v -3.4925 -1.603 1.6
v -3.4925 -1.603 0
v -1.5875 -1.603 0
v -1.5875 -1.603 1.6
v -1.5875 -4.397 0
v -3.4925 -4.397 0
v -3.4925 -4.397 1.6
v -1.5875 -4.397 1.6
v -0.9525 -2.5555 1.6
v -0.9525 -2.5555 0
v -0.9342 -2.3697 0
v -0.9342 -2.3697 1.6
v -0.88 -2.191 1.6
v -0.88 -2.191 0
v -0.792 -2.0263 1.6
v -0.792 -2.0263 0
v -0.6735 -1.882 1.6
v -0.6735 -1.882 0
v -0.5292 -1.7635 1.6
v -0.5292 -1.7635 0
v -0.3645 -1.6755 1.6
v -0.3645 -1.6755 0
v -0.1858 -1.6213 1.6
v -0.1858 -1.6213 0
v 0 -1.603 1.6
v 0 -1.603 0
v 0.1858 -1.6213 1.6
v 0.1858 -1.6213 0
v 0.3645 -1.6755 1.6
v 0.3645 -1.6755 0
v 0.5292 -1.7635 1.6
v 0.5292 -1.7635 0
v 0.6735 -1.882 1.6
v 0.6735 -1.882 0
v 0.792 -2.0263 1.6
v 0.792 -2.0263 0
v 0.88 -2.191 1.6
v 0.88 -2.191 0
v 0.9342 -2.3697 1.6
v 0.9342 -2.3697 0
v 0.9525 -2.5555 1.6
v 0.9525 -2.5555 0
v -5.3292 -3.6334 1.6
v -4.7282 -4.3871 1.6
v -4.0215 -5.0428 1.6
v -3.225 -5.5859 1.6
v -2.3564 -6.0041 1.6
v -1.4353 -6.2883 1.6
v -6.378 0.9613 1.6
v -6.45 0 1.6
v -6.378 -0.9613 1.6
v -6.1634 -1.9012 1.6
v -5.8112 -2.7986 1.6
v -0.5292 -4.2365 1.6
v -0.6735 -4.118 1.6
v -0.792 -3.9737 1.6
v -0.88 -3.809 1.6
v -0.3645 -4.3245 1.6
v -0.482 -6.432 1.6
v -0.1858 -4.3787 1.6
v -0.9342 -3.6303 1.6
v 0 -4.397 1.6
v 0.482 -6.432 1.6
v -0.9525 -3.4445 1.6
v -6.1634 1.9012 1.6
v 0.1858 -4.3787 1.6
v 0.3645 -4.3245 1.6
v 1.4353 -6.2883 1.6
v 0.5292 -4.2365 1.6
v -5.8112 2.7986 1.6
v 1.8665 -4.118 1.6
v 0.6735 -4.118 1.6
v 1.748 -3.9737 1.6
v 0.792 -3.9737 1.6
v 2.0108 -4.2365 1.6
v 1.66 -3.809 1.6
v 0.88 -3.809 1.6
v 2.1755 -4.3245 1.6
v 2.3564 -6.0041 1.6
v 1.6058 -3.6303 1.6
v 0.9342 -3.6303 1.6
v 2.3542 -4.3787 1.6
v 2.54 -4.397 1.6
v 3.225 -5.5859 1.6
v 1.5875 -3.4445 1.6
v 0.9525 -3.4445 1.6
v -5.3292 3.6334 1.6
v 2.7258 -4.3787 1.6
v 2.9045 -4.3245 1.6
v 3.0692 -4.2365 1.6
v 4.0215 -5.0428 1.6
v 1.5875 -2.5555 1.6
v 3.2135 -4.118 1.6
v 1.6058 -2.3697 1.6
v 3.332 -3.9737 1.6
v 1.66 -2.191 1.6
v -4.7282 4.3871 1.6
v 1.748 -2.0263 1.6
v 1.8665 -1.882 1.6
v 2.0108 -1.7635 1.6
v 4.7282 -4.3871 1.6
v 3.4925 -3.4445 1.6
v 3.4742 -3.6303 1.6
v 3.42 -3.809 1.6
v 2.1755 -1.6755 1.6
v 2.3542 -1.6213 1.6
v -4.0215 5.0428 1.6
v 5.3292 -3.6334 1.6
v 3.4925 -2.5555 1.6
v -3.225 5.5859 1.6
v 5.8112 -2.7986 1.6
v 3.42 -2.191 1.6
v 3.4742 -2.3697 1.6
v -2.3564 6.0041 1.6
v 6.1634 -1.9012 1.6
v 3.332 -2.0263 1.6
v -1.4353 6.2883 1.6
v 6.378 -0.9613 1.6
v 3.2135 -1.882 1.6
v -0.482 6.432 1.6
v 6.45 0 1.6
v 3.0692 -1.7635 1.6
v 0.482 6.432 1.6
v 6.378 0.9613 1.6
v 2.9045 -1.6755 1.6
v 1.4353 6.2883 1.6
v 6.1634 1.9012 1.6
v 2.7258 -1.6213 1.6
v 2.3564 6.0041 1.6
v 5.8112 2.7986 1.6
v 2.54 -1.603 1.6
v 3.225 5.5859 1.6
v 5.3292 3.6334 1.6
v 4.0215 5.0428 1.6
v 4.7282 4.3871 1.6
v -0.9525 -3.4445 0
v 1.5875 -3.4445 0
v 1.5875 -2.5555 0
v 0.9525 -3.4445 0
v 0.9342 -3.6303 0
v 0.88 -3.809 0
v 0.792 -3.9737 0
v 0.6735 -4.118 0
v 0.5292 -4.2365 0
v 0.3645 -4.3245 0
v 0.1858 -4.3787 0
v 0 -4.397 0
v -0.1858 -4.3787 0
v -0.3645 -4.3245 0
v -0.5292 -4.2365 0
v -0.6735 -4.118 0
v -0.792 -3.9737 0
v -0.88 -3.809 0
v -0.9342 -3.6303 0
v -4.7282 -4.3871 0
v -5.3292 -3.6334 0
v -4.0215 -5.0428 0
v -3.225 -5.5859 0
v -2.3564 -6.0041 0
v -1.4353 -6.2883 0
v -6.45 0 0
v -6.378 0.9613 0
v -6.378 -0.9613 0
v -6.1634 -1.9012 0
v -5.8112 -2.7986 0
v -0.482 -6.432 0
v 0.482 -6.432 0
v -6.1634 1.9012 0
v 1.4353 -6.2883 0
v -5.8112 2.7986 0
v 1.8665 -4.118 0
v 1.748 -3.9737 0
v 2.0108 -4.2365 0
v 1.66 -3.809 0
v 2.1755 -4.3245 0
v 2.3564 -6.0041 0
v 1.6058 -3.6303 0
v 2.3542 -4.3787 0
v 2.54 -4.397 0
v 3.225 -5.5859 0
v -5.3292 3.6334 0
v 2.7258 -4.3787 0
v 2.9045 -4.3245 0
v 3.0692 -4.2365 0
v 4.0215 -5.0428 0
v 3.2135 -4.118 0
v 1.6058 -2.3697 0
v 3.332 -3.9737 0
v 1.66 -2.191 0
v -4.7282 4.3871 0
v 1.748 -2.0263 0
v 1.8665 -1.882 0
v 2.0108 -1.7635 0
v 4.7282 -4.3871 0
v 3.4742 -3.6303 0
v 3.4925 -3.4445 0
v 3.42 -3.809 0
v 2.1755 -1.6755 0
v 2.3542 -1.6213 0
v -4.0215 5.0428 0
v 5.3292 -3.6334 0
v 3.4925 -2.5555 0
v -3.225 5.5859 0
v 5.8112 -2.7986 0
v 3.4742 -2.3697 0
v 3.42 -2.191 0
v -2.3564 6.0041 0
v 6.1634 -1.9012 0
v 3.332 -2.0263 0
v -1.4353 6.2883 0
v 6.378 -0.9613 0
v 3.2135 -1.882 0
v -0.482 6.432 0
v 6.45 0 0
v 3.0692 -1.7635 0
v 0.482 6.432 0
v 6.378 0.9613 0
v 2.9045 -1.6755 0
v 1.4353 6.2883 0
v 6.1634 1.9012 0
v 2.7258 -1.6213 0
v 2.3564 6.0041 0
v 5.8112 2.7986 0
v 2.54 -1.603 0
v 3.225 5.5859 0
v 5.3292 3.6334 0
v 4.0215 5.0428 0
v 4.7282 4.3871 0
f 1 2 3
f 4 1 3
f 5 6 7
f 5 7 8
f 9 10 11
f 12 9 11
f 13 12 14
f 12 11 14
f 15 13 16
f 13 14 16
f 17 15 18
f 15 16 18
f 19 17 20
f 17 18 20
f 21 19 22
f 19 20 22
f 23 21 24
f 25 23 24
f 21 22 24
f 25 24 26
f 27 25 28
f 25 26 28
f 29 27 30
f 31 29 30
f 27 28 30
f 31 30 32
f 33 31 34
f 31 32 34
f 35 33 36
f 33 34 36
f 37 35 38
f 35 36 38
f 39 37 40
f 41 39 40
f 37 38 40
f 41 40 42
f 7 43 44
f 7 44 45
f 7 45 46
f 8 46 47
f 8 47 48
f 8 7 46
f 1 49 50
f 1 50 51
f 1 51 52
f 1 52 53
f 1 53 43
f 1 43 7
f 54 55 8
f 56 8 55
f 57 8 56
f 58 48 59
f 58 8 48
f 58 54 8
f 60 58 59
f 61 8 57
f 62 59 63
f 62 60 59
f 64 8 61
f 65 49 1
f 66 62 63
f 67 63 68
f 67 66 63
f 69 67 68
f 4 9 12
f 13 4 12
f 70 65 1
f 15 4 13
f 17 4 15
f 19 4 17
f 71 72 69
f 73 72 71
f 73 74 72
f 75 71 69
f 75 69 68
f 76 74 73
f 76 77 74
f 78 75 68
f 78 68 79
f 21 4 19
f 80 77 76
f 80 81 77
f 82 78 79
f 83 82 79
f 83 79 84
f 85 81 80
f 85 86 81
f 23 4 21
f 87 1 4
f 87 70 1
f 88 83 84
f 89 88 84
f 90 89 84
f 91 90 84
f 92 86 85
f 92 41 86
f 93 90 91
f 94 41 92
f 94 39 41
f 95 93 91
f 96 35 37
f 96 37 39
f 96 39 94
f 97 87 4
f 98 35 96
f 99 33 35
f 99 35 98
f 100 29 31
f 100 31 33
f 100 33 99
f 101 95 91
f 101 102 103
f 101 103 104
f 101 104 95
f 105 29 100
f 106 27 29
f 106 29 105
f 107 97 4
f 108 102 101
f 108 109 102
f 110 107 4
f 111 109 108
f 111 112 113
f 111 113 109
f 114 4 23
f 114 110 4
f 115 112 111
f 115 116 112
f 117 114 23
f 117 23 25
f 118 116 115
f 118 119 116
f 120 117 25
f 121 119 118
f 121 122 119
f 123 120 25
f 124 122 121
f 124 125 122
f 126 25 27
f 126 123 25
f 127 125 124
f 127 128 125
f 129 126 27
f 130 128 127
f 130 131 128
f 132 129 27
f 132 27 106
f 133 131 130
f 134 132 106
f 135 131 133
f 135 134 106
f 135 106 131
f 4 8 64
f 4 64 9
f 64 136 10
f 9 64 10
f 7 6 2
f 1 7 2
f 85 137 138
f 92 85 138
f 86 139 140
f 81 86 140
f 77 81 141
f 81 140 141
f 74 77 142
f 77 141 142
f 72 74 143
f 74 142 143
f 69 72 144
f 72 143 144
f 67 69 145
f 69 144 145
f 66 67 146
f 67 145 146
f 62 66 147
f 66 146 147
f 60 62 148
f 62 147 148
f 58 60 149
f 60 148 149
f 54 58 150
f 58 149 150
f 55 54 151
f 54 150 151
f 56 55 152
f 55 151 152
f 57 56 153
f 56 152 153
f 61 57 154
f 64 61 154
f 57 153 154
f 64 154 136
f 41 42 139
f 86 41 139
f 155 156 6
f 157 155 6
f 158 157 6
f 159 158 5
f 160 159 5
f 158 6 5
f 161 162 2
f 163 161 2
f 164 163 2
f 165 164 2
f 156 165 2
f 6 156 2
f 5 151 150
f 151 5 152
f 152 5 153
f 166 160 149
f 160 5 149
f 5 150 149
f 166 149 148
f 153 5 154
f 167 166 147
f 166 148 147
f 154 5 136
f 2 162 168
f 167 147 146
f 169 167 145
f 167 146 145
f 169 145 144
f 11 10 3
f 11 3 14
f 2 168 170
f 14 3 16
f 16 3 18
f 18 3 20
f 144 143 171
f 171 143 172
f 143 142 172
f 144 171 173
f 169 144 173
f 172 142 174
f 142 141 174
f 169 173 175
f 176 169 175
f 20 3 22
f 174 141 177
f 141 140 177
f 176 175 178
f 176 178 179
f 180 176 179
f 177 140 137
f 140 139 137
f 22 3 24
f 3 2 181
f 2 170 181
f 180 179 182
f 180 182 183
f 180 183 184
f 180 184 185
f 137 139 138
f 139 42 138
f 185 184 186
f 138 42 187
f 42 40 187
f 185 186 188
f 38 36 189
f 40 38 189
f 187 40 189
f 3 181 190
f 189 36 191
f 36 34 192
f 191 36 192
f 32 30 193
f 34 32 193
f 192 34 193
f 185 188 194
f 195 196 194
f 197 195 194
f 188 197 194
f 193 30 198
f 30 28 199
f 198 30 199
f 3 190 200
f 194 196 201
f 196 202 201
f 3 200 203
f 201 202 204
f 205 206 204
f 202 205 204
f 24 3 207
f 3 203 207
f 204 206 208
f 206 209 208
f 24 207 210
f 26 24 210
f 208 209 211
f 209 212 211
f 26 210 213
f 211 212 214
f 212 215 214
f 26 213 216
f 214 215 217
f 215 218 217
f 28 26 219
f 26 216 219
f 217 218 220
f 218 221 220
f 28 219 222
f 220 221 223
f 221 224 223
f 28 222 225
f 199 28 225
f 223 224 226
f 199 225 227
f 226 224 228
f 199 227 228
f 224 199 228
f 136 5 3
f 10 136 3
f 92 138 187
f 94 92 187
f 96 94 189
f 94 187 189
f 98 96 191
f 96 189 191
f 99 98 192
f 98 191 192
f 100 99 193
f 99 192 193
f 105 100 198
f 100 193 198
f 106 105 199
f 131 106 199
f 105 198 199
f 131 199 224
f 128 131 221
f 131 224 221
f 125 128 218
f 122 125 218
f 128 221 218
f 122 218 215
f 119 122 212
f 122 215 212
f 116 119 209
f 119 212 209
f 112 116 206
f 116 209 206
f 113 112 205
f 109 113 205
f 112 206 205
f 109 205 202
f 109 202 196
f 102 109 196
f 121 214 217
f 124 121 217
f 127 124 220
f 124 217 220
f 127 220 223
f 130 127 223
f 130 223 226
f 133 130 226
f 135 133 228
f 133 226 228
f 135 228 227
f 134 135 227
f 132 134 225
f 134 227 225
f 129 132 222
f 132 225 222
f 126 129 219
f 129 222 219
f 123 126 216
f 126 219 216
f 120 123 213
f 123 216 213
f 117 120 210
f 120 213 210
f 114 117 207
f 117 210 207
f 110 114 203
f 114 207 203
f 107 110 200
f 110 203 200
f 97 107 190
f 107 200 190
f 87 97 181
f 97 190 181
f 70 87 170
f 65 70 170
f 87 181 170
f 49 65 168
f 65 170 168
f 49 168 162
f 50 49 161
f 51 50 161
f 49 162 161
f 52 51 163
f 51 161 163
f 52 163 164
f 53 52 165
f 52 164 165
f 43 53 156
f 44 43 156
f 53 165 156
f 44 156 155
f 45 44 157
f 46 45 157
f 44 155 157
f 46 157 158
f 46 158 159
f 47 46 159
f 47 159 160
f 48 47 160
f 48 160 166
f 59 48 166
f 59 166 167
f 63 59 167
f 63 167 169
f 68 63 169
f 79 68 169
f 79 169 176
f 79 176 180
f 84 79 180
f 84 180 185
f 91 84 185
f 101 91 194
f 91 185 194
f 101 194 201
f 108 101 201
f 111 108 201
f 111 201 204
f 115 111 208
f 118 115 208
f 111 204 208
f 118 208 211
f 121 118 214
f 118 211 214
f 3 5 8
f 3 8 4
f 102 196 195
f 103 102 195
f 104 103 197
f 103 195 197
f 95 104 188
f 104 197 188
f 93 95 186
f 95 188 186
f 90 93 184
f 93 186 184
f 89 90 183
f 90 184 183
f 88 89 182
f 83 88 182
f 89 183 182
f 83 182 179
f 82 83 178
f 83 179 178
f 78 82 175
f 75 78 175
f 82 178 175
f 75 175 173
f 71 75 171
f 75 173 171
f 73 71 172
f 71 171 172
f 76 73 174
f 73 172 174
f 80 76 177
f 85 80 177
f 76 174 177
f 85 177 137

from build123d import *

# Parameters (mm, degrees)
MODEL_R            = 6.45
MODEL_W            = 1.905
MODEL_H            = 2.794
BOSS_EXTRU_1_DEPTH = 1.6


with BuildPart() as part:
    # Model → Boss.-Extru.1 (new body)
    with BuildSketch(Plane.XY):
        Circle(MODEL_R)
        with Locations((-2.54, -3)):
            Rectangle(MODEL_W, MODEL_H, mode=Mode.SUBTRACT)
        with BuildLine():
            Line((0.9525, -2.5555), (0.9525, -3.4445))
            ThreePointArc((0.9525, -3.4445), (0, -4.397), (-0.9525, -3.4445))
            Line((-0.9525, -3.4445), (-0.9525, -2.5555))
            ThreePointArc((-0.9525, -2.5555), (0, -1.603), (0.9525, -2.5555))
        make_face(mode=Mode.SUBTRACT)
        with BuildLine():
            Line((3.4925, -2.5555), (3.4925, -3.4445))
            ThreePointArc((3.4925, -3.4445), (2.54, -4.397), (1.5875, -3.4445))
            Line((1.5875, -3.4445), (1.5875, -2.5555))
            ThreePointArc((1.5875, -2.5555), (2.54, -1.603), (3.4925, -2.5555))
        make_face(mode=Mode.SUBTRACT)
    extrude(amount=BOSS_EXTRU_1_DEPTH)


solid = part.part
